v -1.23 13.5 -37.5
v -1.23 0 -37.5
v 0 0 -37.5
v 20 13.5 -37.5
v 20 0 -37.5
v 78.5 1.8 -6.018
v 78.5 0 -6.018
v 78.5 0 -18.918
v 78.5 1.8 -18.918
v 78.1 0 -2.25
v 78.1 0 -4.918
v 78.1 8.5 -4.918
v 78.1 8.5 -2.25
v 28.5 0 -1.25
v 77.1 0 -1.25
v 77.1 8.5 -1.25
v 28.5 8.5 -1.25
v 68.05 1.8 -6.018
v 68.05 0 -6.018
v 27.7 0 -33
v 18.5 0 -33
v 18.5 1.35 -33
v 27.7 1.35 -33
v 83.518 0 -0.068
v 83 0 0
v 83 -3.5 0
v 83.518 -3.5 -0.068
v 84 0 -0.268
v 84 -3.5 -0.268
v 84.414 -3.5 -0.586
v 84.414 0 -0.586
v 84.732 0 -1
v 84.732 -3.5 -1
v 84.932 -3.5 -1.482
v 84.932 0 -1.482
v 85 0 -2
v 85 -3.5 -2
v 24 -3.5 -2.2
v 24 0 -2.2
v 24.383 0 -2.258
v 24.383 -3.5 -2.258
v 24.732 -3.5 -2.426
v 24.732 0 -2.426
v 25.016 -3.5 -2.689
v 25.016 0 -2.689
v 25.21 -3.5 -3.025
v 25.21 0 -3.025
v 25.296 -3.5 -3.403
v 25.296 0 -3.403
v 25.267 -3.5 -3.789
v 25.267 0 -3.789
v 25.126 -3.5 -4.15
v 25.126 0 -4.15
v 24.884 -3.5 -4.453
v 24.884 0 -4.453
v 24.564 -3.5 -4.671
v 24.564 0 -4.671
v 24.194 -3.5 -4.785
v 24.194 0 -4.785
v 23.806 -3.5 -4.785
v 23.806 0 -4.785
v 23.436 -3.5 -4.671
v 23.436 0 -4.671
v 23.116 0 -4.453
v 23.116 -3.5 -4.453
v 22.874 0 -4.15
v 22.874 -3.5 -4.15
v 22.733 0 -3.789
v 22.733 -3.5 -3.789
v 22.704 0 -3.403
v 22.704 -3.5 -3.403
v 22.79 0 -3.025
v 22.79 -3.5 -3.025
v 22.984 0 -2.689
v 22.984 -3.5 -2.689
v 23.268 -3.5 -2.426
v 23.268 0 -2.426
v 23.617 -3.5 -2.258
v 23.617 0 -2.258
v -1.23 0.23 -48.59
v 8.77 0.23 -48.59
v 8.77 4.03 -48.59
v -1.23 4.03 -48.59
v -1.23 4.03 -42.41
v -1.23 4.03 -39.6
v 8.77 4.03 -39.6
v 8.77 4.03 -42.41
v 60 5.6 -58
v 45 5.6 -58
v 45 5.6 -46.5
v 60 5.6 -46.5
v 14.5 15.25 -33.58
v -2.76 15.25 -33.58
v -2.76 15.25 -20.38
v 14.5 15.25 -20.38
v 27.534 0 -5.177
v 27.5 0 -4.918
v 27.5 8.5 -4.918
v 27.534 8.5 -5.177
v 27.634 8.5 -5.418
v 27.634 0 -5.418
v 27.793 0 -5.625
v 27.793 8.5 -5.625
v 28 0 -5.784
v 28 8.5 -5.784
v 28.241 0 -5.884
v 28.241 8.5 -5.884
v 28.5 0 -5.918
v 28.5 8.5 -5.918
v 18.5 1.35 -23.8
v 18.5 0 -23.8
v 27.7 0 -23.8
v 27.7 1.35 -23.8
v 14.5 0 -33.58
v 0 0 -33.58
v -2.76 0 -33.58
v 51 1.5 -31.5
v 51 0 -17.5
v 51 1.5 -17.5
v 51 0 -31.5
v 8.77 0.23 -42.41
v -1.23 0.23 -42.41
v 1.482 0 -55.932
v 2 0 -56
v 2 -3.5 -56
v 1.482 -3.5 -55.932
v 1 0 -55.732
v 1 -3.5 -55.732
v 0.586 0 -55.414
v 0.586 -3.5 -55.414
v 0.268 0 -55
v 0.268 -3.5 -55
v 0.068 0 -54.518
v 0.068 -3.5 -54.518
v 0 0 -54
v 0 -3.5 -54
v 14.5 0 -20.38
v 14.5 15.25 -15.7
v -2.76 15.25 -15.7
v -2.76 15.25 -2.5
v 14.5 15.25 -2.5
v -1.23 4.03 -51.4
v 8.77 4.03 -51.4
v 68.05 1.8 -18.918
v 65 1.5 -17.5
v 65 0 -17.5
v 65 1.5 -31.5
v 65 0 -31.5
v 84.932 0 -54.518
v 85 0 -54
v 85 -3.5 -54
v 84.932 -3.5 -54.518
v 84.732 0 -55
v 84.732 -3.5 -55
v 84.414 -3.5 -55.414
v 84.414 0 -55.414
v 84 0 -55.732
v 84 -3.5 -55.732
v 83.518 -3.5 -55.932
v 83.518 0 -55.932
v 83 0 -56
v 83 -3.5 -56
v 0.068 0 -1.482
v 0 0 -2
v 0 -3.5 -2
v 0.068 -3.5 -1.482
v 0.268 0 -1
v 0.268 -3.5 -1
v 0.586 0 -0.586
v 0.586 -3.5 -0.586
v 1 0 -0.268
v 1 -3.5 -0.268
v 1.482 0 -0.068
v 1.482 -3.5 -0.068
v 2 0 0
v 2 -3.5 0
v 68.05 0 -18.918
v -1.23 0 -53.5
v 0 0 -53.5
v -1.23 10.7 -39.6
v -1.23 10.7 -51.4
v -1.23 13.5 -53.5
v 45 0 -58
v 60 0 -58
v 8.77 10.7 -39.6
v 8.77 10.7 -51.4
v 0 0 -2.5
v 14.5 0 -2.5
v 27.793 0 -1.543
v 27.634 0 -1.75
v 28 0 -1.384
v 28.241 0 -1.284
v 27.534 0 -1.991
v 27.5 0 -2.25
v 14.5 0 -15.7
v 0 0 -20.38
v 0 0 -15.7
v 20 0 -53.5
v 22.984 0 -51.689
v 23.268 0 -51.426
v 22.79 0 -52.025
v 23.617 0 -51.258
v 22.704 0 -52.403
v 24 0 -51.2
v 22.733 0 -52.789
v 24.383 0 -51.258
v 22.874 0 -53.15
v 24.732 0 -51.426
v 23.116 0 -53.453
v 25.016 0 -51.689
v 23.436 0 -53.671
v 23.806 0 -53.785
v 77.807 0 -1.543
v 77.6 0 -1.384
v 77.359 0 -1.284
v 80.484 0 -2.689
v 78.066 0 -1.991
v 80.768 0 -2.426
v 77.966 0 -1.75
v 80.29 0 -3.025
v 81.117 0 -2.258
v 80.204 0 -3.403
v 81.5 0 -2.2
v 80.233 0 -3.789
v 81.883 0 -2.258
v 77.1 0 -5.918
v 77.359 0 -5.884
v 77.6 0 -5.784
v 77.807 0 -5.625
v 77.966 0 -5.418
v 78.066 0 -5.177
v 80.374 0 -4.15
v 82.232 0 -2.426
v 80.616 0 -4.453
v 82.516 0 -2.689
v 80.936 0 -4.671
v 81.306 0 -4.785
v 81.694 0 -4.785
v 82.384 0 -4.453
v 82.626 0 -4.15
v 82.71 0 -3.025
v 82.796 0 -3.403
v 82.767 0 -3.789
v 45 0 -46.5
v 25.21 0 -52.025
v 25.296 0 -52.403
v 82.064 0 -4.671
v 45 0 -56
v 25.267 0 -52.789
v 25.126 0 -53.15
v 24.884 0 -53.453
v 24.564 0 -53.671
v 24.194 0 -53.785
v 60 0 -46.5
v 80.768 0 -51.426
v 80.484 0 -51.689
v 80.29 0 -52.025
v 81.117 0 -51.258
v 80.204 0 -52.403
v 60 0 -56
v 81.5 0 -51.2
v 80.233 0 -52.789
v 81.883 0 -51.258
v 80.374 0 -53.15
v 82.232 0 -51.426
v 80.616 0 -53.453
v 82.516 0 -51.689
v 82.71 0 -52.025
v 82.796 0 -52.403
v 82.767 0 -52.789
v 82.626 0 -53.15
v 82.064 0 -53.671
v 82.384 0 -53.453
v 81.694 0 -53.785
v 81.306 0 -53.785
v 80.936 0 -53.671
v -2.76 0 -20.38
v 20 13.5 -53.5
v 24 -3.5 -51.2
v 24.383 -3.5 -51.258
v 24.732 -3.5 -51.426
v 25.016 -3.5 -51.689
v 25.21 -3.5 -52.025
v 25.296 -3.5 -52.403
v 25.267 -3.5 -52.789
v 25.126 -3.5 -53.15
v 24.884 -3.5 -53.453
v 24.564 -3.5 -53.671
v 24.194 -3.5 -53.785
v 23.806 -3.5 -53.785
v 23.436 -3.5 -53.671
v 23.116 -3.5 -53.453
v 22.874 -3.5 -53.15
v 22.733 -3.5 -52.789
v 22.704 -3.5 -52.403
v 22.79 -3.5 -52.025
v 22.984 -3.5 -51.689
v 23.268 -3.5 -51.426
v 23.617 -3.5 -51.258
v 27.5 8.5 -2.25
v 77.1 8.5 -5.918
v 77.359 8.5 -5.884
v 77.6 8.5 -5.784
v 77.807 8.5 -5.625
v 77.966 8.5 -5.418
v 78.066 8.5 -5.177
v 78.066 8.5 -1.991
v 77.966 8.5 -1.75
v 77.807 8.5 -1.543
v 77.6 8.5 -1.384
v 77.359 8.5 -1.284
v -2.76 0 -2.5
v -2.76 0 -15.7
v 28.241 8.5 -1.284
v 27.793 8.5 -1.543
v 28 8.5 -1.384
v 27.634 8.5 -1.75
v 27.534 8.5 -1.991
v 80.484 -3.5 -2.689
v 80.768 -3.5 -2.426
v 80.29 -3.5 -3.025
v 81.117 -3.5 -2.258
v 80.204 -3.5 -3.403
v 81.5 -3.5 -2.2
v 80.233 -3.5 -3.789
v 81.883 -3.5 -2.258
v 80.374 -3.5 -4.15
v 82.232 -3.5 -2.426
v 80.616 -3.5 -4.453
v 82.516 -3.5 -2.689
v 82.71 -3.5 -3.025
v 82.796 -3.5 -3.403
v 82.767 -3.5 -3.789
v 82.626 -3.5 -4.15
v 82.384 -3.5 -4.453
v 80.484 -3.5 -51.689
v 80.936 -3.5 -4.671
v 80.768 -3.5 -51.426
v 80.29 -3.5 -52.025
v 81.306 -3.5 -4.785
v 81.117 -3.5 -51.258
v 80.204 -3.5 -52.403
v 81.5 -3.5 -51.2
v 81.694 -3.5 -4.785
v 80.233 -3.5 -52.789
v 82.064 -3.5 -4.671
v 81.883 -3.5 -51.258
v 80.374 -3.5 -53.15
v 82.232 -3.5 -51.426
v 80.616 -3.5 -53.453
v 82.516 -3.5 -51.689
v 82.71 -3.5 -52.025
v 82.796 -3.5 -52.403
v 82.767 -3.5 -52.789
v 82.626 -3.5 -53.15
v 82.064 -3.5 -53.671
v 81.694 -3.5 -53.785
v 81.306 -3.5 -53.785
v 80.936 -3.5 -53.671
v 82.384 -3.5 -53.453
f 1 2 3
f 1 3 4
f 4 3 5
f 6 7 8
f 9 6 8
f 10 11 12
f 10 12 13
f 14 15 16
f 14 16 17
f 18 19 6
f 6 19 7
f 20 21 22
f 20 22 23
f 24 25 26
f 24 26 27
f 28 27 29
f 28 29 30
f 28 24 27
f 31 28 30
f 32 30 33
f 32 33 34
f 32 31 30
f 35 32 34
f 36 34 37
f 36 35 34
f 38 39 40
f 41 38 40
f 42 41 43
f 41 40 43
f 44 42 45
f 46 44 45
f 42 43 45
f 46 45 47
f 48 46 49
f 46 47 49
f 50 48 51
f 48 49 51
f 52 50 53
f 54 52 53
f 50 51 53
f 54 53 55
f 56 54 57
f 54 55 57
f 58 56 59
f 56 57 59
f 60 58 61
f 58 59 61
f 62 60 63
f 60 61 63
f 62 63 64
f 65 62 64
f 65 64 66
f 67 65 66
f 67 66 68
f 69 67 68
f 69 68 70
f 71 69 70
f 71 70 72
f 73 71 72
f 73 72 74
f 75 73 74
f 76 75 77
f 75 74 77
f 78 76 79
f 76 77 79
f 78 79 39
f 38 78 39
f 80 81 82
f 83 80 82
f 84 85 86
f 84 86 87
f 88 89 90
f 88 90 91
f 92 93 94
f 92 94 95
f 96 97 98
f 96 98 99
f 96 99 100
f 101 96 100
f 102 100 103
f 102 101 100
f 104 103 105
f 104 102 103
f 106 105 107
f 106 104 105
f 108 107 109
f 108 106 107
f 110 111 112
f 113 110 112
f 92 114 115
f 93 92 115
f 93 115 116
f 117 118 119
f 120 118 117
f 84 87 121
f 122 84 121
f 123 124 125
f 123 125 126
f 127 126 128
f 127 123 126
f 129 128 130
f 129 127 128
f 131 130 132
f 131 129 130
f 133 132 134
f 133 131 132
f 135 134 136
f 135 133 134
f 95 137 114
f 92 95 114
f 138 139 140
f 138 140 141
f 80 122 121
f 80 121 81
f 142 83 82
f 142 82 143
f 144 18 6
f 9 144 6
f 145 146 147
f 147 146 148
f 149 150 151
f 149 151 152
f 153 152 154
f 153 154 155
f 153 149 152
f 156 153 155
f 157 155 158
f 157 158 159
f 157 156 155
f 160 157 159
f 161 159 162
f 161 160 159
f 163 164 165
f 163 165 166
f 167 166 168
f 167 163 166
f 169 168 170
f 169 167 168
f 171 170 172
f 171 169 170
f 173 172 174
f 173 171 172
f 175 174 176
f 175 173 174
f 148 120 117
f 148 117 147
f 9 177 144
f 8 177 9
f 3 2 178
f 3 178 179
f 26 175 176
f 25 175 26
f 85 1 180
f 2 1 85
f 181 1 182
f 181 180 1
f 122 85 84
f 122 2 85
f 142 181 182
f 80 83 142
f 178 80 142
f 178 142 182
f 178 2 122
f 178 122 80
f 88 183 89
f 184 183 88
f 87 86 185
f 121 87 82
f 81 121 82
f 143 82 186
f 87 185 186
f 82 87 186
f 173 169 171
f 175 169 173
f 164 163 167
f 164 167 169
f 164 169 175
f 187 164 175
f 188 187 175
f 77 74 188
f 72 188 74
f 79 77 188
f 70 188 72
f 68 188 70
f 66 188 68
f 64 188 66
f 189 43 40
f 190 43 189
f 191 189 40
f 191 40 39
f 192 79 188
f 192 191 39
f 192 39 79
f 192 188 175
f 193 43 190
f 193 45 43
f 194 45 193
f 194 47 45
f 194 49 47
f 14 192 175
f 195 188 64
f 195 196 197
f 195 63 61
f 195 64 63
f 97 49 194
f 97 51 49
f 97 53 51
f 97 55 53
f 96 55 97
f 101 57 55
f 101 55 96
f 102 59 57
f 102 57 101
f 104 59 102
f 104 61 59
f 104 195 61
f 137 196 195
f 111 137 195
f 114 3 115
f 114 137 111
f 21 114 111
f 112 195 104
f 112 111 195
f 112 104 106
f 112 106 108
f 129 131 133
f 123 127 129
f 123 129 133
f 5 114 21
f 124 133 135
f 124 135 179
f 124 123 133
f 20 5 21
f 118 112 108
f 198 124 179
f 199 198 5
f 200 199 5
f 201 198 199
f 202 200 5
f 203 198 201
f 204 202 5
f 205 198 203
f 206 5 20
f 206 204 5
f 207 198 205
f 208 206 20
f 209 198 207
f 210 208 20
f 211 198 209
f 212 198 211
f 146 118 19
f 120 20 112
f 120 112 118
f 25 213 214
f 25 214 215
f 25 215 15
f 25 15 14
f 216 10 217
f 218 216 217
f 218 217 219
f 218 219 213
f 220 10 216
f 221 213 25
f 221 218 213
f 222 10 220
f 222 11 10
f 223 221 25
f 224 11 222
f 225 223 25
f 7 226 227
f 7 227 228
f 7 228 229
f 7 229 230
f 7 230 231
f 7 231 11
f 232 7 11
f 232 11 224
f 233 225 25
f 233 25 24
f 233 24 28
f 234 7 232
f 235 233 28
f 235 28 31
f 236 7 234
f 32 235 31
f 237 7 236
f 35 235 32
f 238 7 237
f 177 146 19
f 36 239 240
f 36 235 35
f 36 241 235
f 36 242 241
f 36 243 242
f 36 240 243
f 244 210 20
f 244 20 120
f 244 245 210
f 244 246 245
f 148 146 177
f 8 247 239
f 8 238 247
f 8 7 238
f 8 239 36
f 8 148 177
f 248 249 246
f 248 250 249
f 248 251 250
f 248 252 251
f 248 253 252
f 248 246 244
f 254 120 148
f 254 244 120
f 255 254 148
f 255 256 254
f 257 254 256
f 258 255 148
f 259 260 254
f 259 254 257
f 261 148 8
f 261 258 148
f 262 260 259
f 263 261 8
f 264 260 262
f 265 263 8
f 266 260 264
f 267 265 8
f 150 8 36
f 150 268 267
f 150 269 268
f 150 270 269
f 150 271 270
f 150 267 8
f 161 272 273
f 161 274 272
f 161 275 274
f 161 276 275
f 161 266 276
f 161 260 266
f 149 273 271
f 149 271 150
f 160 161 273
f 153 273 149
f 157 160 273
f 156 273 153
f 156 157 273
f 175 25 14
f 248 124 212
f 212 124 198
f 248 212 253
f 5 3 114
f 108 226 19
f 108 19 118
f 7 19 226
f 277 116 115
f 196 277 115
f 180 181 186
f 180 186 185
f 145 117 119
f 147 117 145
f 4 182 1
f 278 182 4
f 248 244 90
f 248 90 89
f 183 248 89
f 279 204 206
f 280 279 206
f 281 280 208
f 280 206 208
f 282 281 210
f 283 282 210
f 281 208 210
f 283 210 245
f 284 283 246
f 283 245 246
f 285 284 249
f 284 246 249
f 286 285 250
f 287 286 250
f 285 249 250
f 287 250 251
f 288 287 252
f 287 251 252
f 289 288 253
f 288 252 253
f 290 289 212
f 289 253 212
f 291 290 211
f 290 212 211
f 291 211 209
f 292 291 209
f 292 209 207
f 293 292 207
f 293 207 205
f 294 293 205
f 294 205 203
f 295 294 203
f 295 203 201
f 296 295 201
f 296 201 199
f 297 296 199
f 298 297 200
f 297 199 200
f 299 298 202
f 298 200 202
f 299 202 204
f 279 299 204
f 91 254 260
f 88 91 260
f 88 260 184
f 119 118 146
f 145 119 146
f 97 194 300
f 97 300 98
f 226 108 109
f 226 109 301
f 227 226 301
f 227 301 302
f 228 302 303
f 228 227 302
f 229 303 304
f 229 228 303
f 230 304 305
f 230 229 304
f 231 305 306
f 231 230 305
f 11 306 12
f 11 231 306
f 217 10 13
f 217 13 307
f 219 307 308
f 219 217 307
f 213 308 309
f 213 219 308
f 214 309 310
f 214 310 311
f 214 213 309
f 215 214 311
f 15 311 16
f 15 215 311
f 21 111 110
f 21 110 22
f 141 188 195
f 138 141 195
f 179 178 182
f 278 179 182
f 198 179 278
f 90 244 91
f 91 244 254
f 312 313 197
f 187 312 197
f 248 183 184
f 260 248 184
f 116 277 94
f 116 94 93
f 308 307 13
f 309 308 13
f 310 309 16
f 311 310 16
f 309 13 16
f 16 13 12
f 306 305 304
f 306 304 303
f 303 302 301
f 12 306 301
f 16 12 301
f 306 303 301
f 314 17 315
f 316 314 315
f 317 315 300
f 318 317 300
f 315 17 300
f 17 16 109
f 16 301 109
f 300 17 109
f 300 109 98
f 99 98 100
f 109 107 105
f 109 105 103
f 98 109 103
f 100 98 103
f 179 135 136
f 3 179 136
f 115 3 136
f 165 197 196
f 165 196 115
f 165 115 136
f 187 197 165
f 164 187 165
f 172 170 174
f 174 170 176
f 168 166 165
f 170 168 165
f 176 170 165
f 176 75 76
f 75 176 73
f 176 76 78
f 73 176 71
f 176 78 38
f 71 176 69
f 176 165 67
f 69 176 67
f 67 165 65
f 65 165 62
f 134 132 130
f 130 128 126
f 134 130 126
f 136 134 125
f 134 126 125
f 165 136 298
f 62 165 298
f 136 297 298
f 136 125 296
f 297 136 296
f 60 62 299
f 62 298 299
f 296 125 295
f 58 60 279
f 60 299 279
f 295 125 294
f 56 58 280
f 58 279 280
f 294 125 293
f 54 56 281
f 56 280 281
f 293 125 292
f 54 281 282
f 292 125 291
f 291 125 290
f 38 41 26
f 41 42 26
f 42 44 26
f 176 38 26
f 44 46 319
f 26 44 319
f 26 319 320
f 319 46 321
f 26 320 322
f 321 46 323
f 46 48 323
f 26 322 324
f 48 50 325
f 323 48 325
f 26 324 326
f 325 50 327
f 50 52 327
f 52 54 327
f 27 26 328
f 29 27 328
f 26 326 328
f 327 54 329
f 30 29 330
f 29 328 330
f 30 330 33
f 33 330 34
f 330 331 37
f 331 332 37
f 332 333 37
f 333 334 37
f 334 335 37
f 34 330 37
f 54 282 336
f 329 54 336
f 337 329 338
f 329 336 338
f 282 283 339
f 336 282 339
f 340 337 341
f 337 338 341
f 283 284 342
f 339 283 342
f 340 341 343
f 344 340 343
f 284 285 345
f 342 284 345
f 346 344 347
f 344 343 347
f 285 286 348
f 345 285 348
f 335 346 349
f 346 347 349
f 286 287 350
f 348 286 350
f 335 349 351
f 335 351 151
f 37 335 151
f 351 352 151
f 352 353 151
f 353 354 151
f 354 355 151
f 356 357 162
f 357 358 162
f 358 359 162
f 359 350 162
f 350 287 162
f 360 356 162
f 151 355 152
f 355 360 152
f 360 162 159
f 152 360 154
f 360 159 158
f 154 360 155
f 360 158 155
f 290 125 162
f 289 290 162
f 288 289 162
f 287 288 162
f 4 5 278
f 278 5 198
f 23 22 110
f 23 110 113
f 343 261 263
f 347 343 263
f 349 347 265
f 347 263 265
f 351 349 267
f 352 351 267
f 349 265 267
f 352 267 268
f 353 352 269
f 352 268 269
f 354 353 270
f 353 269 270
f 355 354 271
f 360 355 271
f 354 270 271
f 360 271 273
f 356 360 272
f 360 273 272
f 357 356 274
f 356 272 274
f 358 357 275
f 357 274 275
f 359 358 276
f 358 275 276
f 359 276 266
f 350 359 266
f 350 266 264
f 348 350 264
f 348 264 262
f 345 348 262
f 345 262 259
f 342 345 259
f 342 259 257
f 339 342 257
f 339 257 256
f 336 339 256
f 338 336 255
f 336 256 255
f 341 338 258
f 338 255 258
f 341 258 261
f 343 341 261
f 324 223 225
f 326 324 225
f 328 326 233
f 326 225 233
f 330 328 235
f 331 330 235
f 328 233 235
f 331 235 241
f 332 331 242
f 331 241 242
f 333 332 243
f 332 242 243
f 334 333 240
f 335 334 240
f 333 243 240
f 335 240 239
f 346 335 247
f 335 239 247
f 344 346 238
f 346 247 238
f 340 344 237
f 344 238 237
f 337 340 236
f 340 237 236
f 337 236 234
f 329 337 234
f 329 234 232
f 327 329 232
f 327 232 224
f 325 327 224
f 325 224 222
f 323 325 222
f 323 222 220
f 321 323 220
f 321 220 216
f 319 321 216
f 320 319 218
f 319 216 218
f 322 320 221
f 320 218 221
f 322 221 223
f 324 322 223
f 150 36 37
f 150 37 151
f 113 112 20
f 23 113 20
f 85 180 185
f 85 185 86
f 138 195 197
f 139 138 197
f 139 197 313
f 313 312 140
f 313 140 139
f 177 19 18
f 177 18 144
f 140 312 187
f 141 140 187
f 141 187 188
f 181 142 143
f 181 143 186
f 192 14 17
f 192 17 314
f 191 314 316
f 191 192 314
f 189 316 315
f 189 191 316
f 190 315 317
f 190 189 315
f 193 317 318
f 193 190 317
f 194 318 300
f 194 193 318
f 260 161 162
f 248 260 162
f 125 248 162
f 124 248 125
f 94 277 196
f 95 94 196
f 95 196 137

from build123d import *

# Parameters (mm, degrees)
SKETCH1_R           = 1.3
BOSS_EXTRUDE1_DEPTH = 3.5
SKETCH1_3_W         = 21.23
SKETCH1_3_H         = 16
BOSS_EXTRUDE2_DEPTH = 13.5
SKETCH1_4_W         = 17.26
SKETCH1_4_H         = 13.2
BOSS_EXTRUDE3_DEPTH = 15.25
SKETCH1_5_W         = 14
SKETCH1_5_H         = 14
BOSS_EXTRUDE4_DEPTH = 1.5
SKETCH1_6_W         = 15
SKETCH1_6_H         = 11.5
BOSS_EXTRUDE5_DEPTH = 5.6
SKETCH1_7_W         = 9.2
SKETCH1_7_H         = 9.2
BOSS_EXTRUDE6_DEPTH = 1.35
SKETCH1_8_W         = 10.45
SKETCH1_8_H         = 12.9
BOSS_EXTRUDE7_DEPTH = 1.8
BOSS_EXTRUDE8_DEPTH = 8.5
CUT_EXTRUDE1_DEPTH  = 10


with BuildPart() as part:
    # Sketch1 → Boss-Extrude1 (new body)
    with BuildSketch(Plane(origin=(0, 0, 0), x_dir=(1, 0, 0), z_dir=(0, 1, 0))):
        with BuildLine():
            ThreePointArc((0, 2), (0.585786438, 0.585786438), (2, 0))
            Line((2, 0), (83, 0))
            ThreePointArc((83, 0), (84.414213562, 0.585786438), (85, 2))
            Line((85, 2), (85, 54))
            ThreePointArc((85, 54), (84.414213562, 55.414213562), (83, 56))
            Line((83, 56), (2, 56))
            ThreePointArc((2, 56), (0.585786438, 55.414213562), (0, 54))
            Line((0, 54), (0, 2))
        make_face()
        with Locations((24, 3.5)):
            Circle(SKETCH1_R, mode=Mode.SUBTRACT)
        with Locations((81.5, 3.5)):
            Circle(SKETCH1_R, mode=Mode.SUBTRACT)
        with Locations((24, 52.5)):
            Circle(SKETCH1_R, mode=Mode.SUBTRACT)
        with Locations((81.5, 52.5)):
            Circle(SKETCH1_R, mode=Mode.SUBTRACT)
    extrude(amount=-BOSS_EXTRUDE1_DEPTH)

    # Sketch1<3> → Boss-Extrude2 (add)
    with BuildSketch(Plane(origin=(0, 0, 0), x_dir=(1, 0, 0), z_dir=(0, 1, 0))):
        with Locations((9.385, 45.5)):
            Rectangle(SKETCH1_3_W, SKETCH1_3_H)
    extrude(amount=BOSS_EXTRUDE2_DEPTH)

    # Sketch1<4> → Boss-Extrude3 (add)
    with BuildSketch(Plane(origin=(0, 0, 0), x_dir=(1, 0, 0), z_dir=(0, 1, 0))):
        with Locations((5.87, 9.1)):
            Rectangle(SKETCH1_4_W, SKETCH1_4_H)
        with Locations((5.87, 26.98)):
            Rectangle(SKETCH1_4_W, SKETCH1_4_H)
    extrude(amount=BOSS_EXTRUDE3_DEPTH)

    # Sketch1<5> → Boss-Extrude4 (add)
    with BuildSketch(Plane(origin=(0, 0, 0), x_dir=(1, 0, 0), z_dir=(0, 1, 0))):
        with Locations((58, 24.5)):
            Rectangle(SKETCH1_5_W, SKETCH1_5_H)
    extrude(amount=BOSS_EXTRUDE4_DEPTH)

    # Sketch1<6> → Boss-Extrude5 (add)
    with BuildSketch(Plane(origin=(0, 0, 0), x_dir=(1, 0, 0), z_dir=(0, 1, 0))):
        with Locations((52.5, 52.25)):
            Rectangle(SKETCH1_6_W, SKETCH1_6_H)
    extrude(amount=BOSS_EXTRUDE5_DEPTH)

    # Sketch1<7> → Boss-Extrude6 (add)
    with BuildSketch(Plane(origin=(0, 0, 0), x_dir=(1, 0, 0), z_dir=(0, 1, 0))):
        with Locations((23.1, 28.4)):
            Rectangle(SKETCH1_7_W, SKETCH1_7_H)
    extrude(amount=BOSS_EXTRUDE6_DEPTH)

    # Sketch1<8> → Boss-Extrude7 (add)
    with BuildSketch(Plane(origin=(0, 0, 0), x_dir=(1, 0, 0), z_dir=(0, 1, 0))):
        with Locations((73.275, 12.468354001)):
            Rectangle(SKETCH1_8_W, SKETCH1_8_H)
    extrude(amount=BOSS_EXTRUDE7_DEPTH)

    # Sketch1<9> → Boss-Extrude8 (add)
    with BuildSketch(Plane(origin=(0, 0, 0), x_dir=(1, 0, 0), z_dir=(0, 1, 0))):
        with BuildLine():
            ThreePointArc((27.5, 2.25), (27.792893219, 1.542893219), (28.5, 1.25))
            Line((28.5, 1.25), (77.1, 1.25))
            ThreePointArc((77.1, 1.25), (77.807106781, 1.542893219), (78.1, 2.25))
            Line((78.1, 2.25), (78.1, 4.918354001))
            ThreePointArc((78.1, 4.918354001), (77.807106781, 5.625460782), (77.1, 5.918354001))
            Line((77.1, 5.918354001), (28.5, 5.918354001))
            ThreePointArc((28.5, 5.918354001), (27.792893219, 5.625460782), (27.5, 4.918354001))
            Line((27.5, 4.918354001), (27.5, 2.25))
        make_face()
    extrude(amount=BOSS_EXTRUDE8_DEPTH)

    # Sketch3 → Cut-Extrude1 (cut)
    with BuildSketch(Plane.ZY.offset(1.23)):
        Polygon((-51.4, 10.7), (-39.6, 10.7), (-39.6, 4.03), (-42.41, 4.03), (-42.41, 0.23), (-48.59, 0.23), (-48.59, 4.03), (-51.4, 4.03), align=None)
    extrude(amount=-CUT_EXTRUDE1_DEPTH, mode=Mode.SUBTRACT)


solid = part.part
